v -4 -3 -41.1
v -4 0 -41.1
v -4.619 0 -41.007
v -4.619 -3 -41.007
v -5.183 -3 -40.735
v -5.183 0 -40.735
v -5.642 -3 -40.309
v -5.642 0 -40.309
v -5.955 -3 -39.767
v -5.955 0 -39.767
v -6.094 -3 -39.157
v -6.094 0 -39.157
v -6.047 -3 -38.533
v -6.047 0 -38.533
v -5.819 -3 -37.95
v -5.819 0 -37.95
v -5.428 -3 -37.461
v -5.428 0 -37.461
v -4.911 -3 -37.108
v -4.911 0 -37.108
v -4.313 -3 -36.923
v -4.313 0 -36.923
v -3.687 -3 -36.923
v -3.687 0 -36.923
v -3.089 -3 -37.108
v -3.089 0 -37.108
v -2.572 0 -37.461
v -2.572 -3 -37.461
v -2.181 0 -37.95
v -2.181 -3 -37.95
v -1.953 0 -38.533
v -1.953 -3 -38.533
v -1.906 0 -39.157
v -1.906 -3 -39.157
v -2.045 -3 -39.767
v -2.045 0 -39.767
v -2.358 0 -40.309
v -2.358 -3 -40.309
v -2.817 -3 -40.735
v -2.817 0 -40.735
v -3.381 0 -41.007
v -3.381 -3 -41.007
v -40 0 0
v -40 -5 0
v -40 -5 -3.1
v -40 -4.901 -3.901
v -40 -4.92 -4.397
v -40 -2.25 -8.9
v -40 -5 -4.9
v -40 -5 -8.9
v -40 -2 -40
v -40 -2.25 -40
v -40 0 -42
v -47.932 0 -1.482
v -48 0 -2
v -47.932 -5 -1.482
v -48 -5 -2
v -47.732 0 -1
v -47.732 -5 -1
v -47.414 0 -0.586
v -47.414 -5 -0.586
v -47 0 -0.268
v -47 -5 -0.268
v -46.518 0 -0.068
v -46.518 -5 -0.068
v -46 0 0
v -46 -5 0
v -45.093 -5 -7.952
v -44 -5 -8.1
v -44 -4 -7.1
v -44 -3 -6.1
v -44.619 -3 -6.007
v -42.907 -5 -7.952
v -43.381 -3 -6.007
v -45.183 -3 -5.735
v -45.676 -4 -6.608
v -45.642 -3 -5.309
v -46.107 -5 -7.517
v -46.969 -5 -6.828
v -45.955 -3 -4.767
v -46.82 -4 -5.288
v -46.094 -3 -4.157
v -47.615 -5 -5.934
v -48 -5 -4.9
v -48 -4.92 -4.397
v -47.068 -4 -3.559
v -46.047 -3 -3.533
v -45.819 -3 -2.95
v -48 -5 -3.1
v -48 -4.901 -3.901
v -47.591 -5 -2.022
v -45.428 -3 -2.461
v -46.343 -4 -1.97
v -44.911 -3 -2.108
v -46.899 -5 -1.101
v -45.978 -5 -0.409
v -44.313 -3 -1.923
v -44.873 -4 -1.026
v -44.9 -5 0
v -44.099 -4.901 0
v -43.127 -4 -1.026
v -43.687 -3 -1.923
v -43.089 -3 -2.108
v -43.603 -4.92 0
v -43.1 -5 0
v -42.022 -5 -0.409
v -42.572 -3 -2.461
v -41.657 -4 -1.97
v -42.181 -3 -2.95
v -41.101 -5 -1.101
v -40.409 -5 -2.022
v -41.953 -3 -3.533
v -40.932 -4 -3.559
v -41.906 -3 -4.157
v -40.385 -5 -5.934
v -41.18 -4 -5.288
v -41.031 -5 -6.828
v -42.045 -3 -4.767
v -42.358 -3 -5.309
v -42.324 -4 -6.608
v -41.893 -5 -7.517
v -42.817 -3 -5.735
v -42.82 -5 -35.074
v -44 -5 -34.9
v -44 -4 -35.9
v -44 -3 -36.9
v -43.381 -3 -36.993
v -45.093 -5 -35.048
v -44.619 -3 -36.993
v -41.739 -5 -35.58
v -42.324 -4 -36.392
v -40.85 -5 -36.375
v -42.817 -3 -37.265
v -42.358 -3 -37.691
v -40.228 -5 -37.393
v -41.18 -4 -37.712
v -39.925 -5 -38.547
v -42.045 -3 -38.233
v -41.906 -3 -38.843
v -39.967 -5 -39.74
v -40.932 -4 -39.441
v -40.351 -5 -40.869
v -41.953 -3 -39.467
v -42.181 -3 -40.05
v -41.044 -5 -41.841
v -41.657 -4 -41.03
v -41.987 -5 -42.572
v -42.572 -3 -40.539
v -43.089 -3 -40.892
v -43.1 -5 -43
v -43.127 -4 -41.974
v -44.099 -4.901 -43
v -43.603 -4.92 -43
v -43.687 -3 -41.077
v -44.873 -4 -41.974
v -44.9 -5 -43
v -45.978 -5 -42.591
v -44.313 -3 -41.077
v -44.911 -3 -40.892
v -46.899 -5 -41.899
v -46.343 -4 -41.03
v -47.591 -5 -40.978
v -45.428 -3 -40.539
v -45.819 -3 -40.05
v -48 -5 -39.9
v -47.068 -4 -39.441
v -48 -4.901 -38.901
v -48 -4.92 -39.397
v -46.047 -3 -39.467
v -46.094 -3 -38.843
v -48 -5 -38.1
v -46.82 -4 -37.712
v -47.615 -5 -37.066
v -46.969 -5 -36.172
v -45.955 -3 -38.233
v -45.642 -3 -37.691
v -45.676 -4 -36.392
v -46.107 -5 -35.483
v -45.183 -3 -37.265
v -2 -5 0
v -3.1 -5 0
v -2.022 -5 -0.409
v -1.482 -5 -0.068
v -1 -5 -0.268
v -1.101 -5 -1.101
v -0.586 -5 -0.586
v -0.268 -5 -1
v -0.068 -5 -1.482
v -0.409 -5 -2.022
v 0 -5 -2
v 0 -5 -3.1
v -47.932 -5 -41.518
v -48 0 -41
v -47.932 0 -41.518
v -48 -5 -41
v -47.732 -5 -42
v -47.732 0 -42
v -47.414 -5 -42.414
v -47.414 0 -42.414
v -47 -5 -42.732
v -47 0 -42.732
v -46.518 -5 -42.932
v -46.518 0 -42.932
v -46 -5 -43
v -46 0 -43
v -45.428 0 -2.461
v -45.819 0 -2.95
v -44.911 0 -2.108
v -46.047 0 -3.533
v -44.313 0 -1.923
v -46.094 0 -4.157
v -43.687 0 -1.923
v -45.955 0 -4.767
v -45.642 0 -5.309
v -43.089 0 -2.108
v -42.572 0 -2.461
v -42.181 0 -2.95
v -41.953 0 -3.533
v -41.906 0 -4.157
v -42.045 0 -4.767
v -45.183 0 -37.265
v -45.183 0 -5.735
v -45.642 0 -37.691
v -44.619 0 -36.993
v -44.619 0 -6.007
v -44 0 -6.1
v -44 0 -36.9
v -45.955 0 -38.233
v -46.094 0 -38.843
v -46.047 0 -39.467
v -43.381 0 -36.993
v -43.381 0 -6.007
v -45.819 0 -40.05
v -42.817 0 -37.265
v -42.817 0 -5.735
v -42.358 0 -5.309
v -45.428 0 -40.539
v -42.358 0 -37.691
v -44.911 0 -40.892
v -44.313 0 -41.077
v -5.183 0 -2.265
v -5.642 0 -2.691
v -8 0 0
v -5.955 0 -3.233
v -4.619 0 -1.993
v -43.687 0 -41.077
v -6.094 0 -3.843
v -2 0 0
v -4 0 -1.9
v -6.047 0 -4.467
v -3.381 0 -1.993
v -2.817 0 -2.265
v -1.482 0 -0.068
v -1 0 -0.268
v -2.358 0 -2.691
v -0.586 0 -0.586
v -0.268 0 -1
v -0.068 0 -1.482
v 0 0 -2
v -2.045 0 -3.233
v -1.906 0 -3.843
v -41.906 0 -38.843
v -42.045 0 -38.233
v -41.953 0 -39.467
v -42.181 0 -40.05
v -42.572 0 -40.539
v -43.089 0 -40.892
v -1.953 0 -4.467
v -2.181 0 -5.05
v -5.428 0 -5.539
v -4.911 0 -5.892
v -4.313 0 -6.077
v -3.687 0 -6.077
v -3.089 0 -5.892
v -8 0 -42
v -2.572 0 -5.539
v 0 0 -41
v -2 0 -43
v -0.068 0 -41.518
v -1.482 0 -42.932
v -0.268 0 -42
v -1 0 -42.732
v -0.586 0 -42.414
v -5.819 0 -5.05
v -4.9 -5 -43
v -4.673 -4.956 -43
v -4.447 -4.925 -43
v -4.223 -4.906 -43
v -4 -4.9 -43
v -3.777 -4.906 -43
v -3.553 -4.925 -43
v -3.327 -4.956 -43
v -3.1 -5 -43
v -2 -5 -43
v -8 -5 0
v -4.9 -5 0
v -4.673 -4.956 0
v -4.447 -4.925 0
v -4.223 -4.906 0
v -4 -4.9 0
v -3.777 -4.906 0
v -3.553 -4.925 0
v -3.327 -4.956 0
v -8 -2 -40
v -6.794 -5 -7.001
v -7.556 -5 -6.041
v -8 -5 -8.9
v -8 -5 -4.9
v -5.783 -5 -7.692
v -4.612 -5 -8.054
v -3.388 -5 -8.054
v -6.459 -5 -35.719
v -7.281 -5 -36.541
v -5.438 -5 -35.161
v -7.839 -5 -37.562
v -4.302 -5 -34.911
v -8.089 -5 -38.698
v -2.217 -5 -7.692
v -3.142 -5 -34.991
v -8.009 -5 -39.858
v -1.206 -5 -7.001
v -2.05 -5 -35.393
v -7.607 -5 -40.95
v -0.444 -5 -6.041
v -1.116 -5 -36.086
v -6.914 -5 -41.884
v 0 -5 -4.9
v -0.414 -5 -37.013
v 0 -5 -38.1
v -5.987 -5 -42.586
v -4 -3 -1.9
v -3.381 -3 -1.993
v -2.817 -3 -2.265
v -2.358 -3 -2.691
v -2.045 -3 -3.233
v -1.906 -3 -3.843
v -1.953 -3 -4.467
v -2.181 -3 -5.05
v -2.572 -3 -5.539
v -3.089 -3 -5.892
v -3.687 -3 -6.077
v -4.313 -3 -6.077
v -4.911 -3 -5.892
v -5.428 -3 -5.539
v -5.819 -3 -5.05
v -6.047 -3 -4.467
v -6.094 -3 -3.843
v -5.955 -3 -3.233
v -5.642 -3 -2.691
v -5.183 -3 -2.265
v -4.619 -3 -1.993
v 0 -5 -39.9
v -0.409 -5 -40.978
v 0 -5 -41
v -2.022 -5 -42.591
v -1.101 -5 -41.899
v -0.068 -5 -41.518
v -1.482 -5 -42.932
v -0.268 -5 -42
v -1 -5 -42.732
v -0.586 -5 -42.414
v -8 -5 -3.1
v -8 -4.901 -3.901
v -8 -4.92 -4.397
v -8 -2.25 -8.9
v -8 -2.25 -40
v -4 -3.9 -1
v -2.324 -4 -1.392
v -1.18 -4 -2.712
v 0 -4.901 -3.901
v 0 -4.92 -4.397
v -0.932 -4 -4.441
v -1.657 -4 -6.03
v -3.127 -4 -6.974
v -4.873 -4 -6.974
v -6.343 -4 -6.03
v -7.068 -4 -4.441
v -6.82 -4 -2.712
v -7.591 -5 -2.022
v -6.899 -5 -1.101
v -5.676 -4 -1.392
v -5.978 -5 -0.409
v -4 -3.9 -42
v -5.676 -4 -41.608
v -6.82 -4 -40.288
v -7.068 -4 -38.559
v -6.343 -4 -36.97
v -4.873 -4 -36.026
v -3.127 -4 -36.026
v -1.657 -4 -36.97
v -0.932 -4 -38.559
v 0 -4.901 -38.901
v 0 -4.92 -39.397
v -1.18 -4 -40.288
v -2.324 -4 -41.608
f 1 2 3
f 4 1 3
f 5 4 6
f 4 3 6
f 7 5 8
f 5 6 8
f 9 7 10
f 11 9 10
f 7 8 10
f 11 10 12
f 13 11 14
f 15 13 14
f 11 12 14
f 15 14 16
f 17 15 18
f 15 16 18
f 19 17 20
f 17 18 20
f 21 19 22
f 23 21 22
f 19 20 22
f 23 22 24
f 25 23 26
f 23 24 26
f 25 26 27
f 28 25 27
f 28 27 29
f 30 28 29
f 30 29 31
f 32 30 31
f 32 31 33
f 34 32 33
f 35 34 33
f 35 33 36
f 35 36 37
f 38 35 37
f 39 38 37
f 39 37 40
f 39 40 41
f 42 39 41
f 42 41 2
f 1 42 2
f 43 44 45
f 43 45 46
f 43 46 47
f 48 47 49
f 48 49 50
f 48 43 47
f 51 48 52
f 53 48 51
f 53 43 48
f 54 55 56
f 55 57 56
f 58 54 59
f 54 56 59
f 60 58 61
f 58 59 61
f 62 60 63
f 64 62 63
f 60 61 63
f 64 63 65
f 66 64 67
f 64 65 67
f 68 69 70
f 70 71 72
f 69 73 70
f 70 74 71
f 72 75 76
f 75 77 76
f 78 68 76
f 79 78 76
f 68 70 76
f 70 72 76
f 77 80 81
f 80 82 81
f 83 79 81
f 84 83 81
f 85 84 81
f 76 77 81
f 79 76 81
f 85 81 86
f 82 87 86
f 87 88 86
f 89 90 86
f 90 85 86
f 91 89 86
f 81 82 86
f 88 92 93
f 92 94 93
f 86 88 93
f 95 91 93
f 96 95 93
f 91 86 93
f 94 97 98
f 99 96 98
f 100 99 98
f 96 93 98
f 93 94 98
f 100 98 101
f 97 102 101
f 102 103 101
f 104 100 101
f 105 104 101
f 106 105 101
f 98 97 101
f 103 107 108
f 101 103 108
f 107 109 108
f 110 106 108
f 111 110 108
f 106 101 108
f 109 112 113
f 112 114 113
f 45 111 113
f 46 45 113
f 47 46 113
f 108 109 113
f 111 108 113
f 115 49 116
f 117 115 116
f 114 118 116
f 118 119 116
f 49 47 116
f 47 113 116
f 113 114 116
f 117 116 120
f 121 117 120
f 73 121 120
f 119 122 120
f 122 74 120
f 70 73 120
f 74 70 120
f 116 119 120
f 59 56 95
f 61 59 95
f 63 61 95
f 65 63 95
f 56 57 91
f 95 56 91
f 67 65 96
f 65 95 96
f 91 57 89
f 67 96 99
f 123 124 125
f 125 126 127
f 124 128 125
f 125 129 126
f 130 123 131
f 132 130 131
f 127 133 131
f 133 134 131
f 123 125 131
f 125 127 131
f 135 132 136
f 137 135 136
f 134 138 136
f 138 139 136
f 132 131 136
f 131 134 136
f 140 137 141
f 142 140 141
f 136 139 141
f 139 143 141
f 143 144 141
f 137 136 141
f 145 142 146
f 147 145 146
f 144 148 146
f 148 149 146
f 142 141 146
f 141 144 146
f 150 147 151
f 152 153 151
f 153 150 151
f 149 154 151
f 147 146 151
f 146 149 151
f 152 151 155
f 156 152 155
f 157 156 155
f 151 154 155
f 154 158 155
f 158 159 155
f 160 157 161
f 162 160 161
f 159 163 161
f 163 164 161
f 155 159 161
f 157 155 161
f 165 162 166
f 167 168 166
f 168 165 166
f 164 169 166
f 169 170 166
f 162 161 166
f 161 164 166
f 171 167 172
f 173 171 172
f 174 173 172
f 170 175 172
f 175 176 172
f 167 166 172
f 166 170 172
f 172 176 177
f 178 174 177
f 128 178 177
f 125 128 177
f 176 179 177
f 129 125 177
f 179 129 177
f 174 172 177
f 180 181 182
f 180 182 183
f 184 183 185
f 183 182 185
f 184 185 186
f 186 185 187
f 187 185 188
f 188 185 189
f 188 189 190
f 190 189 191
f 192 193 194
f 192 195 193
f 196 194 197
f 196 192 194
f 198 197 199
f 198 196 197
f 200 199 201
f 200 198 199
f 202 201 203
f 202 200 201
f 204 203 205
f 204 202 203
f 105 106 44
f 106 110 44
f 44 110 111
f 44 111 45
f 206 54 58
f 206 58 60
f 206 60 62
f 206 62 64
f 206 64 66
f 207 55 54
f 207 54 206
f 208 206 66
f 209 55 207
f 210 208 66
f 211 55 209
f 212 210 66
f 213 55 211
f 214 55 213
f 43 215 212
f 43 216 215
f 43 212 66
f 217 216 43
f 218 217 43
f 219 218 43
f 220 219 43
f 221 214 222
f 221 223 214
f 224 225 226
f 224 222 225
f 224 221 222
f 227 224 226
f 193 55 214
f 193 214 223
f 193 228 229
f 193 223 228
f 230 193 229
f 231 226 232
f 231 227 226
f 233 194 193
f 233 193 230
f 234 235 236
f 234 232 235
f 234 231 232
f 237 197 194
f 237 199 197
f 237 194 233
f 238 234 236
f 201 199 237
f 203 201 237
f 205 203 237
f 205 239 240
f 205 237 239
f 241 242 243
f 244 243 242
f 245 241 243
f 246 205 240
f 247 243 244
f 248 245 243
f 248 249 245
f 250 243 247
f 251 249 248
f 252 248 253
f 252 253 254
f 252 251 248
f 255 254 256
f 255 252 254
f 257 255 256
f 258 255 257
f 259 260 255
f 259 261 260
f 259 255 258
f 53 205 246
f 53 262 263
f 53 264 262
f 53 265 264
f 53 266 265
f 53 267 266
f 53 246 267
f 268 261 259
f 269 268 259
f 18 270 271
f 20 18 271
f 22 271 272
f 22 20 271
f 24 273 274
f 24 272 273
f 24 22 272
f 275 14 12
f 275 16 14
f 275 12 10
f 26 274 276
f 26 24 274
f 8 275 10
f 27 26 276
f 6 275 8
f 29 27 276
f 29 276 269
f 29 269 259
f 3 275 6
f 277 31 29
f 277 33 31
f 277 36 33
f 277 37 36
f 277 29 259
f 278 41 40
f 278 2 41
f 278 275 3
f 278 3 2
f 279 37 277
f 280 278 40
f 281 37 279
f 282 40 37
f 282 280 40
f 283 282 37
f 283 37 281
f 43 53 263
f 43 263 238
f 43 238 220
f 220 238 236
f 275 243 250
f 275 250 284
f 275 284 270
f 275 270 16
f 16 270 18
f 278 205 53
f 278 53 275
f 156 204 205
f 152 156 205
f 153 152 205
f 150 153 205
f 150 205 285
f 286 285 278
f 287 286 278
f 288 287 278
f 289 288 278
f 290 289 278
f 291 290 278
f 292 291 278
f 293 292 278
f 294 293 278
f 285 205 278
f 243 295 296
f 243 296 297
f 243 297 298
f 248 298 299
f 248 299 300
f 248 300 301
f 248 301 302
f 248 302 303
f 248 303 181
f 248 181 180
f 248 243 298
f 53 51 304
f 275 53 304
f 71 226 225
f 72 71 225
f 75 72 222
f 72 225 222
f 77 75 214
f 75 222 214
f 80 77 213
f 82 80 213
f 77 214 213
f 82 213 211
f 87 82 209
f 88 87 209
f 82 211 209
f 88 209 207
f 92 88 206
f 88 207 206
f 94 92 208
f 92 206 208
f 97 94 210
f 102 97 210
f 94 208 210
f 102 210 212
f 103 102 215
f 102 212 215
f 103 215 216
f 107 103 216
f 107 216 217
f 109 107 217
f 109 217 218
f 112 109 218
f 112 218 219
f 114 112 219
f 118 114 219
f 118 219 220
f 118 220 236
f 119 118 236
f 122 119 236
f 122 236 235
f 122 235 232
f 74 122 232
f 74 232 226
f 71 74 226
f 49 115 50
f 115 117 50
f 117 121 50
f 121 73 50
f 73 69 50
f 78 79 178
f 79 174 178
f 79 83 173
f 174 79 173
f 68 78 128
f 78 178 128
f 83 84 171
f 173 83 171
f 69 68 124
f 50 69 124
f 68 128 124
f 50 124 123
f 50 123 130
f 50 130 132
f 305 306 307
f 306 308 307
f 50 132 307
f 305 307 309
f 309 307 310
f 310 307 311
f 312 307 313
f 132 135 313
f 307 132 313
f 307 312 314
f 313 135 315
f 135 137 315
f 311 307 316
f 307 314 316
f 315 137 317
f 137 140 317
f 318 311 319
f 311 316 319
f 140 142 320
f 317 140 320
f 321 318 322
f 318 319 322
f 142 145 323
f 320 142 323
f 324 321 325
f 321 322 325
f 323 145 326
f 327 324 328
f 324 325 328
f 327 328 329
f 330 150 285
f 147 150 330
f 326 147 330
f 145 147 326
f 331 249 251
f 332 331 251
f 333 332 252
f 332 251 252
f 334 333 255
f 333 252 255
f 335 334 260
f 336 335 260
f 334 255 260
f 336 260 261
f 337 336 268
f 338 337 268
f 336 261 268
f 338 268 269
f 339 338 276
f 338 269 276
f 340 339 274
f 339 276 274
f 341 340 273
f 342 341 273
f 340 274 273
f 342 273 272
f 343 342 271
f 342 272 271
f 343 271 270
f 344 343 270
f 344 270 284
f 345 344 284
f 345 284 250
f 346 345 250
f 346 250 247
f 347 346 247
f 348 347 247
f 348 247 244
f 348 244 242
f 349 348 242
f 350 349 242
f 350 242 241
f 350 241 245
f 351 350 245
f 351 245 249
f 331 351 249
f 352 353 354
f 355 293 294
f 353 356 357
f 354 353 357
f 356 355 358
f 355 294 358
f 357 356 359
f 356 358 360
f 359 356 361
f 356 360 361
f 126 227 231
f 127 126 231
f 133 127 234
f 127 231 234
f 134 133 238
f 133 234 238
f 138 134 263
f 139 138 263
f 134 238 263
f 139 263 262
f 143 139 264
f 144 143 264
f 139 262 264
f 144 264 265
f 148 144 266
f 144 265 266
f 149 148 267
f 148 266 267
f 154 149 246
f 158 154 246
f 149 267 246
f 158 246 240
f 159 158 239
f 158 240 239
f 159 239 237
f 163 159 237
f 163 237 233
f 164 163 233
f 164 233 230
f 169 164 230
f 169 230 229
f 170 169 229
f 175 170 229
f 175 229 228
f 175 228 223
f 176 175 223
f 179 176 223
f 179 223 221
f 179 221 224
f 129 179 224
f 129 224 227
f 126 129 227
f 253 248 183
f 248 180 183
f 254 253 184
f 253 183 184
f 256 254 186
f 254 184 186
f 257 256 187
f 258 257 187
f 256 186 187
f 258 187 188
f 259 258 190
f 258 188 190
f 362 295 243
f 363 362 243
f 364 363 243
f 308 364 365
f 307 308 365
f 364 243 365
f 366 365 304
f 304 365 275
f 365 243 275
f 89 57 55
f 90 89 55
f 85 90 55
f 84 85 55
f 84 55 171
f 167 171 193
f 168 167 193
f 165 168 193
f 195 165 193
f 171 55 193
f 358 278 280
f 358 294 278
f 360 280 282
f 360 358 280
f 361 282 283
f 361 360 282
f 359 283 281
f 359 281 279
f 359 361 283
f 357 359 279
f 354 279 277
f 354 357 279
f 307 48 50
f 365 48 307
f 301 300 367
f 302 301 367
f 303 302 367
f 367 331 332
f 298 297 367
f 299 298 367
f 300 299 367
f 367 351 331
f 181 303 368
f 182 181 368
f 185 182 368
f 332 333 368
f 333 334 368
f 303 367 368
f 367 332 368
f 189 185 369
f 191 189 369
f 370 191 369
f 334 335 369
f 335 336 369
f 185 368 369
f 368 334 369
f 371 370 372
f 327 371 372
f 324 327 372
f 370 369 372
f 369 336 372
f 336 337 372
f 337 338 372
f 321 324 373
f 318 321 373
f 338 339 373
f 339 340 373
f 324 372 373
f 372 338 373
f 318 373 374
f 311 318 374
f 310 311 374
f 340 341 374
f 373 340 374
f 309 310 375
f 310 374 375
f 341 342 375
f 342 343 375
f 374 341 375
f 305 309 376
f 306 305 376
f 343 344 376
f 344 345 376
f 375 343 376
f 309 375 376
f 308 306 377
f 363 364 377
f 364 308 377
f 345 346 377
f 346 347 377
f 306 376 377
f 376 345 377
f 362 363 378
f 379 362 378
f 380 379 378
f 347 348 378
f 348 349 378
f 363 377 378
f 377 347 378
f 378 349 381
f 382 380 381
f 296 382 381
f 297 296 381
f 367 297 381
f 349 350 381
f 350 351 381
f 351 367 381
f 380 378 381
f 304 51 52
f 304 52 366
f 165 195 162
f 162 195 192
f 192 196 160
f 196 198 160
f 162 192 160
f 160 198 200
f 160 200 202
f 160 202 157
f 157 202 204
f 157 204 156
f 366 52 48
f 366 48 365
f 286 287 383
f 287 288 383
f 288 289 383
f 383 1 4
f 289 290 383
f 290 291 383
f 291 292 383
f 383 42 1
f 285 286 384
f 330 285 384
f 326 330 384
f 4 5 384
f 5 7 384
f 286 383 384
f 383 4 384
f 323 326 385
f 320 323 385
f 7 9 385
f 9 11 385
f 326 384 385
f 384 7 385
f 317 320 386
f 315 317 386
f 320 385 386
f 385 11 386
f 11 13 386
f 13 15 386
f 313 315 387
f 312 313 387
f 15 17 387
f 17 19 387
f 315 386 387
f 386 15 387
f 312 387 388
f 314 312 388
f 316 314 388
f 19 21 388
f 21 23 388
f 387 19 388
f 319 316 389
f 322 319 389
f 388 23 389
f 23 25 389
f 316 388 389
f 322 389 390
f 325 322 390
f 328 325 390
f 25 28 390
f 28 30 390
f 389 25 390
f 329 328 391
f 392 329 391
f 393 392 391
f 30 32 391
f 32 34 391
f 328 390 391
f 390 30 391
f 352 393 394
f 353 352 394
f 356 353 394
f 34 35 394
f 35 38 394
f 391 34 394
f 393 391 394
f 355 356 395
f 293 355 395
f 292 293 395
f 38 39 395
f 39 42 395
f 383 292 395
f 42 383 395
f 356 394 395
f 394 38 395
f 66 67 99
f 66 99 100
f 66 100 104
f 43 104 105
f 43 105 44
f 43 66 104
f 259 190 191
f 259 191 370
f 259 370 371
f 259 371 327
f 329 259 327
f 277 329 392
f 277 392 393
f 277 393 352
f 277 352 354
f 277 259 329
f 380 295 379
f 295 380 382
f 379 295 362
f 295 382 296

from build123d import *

# Parameters (mm, degrees)
SKETCH_1_W          = 48
SKETCH_1_H          = 43
EXTRUDE_1_DEPTH     = 5
SKETCH_2_W          = 32
SKETCH_2_H          = 40
CUT_EXTRUDE_1_DEPTH = 2.25
SKETCH_3_R          = 2.1
CUT_EXTRUDE_2_DEPTH = 65.637450445
CHAMFER_1_SIZE      = 2
FILLET_1_R          = 2
CHAMFER_2_SIZE      = 2
SKETCH_4_W          = 32
SKETCH_4_H          = 8.9
CUT_EXTRUDE_3_DEPTH = 65.502422435


with BuildPart() as part:
    # Эскиз1 → Бобышка-Вытянуть1 (new body)
    with BuildSketch(Plane(origin=(0, 0, 0), x_dir=(1, 0, 0), z_dir=(0, 1, 0))):
        with Locations((-24, 21.5)):
            Rectangle(SKETCH_1_W, SKETCH_1_H)
    extrude(amount=-EXTRUDE_1_DEPTH)

    # Эскиз2 → Вырез-Вытянуть1 (cut)
    with BuildSketch(Plane(origin=(0, 0, 0), x_dir=(1, 0, 0), z_dir=(0, 1, 0))):
        with Locations((-24, 20)):
            Rectangle(SKETCH_2_W, SKETCH_2_H)
    extrude(amount=-CUT_EXTRUDE_1_DEPTH, mode=Mode.SUBTRACT)

    # Эскиз3 → Вырез-Вытянуть2 (cut, through all)
    with BuildSketch(Plane(origin=(0, 0, 0), x_dir=(1, 0, 0), z_dir=(0, 1, 0))):
        with Locations(Location((-44, 39, 0), (0, 0, 270))):
            Circle(SKETCH_3_R)
        with Locations(Location((-4, 39, 0), (0, 0, 90))):
            Circle(SKETCH_3_R)
        with Locations(Location((-4, 4, 0), (0, 0, 270))):
            Circle(SKETCH_3_R)
        with Locations(Location((-44, 4, 0), (0, 0, 90))):
            Circle(SKETCH_3_R)
    extrude(amount=-CUT_EXTRUDE_2_DEPTH, mode=Mode.SUBTRACT)

    # Фаска1
    # the kernel refuses this chamfer: 2 mm, written as the material it takes off along each edge
    with BuildSketch(Plane(origin=(-44, -5, -4), x_dir=(0, 0, -1), z_dir=(1, 0, 0))) as chamfer_1_piece_1:
        Polygon((2.1 + CHAMFER_1_SIZE, 0), (2.1, CHAMFER_1_SIZE), (2.1, 0), align=None)
    revolve(axis=Axis((-44, -5, -4), (0, 1, 0)), mode=Mode.SUBTRACT)
    with BuildSketch(Plane(origin=(-4, -5, -4), x_dir=(0, 0, 1), z_dir=(-1, 0, 0))) as chamfer_1_piece_2:
        Polygon((2.1 + CHAMFER_1_SIZE, 0), (2.1, CHAMFER_1_SIZE), (2.1, 0), align=None)
    revolve(axis=Axis((-4, -5, -4), (0, 1, 0)), mode=Mode.SUBTRACT)
    with BuildSketch(Plane(origin=(-4, -5, -39), x_dir=(0, 0, -1), z_dir=(1, 0, 0))) as chamfer_1_piece_3:
        Polygon((2.1 + CHAMFER_1_SIZE, 0), (2.1, CHAMFER_1_SIZE), (2.1, 0), align=None)
    revolve(axis=Axis((-4, -5, -39), (0, 1, 0)), mode=Mode.SUBTRACT)
    with BuildSketch(Plane(origin=(-44, -5, -39), x_dir=(0, 0, 1), z_dir=(-1, 0, 0))) as chamfer_1_piece_4:
        Polygon((2.1 + CHAMFER_1_SIZE, 0), (2.1, CHAMFER_1_SIZE), (2.1, 0), align=None)
    revolve(axis=Axis((-44, -5, -39), (0, 1, 0)), mode=Mode.SUBTRACT)

    # Скругление1
    fillet_1_edges = [part.edges().sort_by_distance(p)[0] for p in [
        (-48, -2.5, -43),
        (0, -2.5, -43),
        (0, -2.5, 0),
        (-48, -2.5, 0),
    ]]
    fillet(fillet_1_edges, radius=FILLET_1_R)

    # Фаска2
    chamfer_2_edges = [part.edges().sort_by_distance(p)[0] for p in [
        (-24, 0, -40),
    ]]
    chamfer(chamfer_2_edges, length=CHAMFER_2_SIZE)

    # Эскиз4 → Вырез-Вытянуть3 (cut, through all)
    with BuildSketch(Plane(origin=(0, -2.25, 0), x_dir=(1, 0, 0), z_dir=(0, 1, 0))):
        with Locations((-24, 4.45)):
            Rectangle(SKETCH_4_W, SKETCH_4_H)
    extrude(amount=-CUT_EXTRUDE_3_DEPTH, mode=Mode.SUBTRACT)


solid = part.part
